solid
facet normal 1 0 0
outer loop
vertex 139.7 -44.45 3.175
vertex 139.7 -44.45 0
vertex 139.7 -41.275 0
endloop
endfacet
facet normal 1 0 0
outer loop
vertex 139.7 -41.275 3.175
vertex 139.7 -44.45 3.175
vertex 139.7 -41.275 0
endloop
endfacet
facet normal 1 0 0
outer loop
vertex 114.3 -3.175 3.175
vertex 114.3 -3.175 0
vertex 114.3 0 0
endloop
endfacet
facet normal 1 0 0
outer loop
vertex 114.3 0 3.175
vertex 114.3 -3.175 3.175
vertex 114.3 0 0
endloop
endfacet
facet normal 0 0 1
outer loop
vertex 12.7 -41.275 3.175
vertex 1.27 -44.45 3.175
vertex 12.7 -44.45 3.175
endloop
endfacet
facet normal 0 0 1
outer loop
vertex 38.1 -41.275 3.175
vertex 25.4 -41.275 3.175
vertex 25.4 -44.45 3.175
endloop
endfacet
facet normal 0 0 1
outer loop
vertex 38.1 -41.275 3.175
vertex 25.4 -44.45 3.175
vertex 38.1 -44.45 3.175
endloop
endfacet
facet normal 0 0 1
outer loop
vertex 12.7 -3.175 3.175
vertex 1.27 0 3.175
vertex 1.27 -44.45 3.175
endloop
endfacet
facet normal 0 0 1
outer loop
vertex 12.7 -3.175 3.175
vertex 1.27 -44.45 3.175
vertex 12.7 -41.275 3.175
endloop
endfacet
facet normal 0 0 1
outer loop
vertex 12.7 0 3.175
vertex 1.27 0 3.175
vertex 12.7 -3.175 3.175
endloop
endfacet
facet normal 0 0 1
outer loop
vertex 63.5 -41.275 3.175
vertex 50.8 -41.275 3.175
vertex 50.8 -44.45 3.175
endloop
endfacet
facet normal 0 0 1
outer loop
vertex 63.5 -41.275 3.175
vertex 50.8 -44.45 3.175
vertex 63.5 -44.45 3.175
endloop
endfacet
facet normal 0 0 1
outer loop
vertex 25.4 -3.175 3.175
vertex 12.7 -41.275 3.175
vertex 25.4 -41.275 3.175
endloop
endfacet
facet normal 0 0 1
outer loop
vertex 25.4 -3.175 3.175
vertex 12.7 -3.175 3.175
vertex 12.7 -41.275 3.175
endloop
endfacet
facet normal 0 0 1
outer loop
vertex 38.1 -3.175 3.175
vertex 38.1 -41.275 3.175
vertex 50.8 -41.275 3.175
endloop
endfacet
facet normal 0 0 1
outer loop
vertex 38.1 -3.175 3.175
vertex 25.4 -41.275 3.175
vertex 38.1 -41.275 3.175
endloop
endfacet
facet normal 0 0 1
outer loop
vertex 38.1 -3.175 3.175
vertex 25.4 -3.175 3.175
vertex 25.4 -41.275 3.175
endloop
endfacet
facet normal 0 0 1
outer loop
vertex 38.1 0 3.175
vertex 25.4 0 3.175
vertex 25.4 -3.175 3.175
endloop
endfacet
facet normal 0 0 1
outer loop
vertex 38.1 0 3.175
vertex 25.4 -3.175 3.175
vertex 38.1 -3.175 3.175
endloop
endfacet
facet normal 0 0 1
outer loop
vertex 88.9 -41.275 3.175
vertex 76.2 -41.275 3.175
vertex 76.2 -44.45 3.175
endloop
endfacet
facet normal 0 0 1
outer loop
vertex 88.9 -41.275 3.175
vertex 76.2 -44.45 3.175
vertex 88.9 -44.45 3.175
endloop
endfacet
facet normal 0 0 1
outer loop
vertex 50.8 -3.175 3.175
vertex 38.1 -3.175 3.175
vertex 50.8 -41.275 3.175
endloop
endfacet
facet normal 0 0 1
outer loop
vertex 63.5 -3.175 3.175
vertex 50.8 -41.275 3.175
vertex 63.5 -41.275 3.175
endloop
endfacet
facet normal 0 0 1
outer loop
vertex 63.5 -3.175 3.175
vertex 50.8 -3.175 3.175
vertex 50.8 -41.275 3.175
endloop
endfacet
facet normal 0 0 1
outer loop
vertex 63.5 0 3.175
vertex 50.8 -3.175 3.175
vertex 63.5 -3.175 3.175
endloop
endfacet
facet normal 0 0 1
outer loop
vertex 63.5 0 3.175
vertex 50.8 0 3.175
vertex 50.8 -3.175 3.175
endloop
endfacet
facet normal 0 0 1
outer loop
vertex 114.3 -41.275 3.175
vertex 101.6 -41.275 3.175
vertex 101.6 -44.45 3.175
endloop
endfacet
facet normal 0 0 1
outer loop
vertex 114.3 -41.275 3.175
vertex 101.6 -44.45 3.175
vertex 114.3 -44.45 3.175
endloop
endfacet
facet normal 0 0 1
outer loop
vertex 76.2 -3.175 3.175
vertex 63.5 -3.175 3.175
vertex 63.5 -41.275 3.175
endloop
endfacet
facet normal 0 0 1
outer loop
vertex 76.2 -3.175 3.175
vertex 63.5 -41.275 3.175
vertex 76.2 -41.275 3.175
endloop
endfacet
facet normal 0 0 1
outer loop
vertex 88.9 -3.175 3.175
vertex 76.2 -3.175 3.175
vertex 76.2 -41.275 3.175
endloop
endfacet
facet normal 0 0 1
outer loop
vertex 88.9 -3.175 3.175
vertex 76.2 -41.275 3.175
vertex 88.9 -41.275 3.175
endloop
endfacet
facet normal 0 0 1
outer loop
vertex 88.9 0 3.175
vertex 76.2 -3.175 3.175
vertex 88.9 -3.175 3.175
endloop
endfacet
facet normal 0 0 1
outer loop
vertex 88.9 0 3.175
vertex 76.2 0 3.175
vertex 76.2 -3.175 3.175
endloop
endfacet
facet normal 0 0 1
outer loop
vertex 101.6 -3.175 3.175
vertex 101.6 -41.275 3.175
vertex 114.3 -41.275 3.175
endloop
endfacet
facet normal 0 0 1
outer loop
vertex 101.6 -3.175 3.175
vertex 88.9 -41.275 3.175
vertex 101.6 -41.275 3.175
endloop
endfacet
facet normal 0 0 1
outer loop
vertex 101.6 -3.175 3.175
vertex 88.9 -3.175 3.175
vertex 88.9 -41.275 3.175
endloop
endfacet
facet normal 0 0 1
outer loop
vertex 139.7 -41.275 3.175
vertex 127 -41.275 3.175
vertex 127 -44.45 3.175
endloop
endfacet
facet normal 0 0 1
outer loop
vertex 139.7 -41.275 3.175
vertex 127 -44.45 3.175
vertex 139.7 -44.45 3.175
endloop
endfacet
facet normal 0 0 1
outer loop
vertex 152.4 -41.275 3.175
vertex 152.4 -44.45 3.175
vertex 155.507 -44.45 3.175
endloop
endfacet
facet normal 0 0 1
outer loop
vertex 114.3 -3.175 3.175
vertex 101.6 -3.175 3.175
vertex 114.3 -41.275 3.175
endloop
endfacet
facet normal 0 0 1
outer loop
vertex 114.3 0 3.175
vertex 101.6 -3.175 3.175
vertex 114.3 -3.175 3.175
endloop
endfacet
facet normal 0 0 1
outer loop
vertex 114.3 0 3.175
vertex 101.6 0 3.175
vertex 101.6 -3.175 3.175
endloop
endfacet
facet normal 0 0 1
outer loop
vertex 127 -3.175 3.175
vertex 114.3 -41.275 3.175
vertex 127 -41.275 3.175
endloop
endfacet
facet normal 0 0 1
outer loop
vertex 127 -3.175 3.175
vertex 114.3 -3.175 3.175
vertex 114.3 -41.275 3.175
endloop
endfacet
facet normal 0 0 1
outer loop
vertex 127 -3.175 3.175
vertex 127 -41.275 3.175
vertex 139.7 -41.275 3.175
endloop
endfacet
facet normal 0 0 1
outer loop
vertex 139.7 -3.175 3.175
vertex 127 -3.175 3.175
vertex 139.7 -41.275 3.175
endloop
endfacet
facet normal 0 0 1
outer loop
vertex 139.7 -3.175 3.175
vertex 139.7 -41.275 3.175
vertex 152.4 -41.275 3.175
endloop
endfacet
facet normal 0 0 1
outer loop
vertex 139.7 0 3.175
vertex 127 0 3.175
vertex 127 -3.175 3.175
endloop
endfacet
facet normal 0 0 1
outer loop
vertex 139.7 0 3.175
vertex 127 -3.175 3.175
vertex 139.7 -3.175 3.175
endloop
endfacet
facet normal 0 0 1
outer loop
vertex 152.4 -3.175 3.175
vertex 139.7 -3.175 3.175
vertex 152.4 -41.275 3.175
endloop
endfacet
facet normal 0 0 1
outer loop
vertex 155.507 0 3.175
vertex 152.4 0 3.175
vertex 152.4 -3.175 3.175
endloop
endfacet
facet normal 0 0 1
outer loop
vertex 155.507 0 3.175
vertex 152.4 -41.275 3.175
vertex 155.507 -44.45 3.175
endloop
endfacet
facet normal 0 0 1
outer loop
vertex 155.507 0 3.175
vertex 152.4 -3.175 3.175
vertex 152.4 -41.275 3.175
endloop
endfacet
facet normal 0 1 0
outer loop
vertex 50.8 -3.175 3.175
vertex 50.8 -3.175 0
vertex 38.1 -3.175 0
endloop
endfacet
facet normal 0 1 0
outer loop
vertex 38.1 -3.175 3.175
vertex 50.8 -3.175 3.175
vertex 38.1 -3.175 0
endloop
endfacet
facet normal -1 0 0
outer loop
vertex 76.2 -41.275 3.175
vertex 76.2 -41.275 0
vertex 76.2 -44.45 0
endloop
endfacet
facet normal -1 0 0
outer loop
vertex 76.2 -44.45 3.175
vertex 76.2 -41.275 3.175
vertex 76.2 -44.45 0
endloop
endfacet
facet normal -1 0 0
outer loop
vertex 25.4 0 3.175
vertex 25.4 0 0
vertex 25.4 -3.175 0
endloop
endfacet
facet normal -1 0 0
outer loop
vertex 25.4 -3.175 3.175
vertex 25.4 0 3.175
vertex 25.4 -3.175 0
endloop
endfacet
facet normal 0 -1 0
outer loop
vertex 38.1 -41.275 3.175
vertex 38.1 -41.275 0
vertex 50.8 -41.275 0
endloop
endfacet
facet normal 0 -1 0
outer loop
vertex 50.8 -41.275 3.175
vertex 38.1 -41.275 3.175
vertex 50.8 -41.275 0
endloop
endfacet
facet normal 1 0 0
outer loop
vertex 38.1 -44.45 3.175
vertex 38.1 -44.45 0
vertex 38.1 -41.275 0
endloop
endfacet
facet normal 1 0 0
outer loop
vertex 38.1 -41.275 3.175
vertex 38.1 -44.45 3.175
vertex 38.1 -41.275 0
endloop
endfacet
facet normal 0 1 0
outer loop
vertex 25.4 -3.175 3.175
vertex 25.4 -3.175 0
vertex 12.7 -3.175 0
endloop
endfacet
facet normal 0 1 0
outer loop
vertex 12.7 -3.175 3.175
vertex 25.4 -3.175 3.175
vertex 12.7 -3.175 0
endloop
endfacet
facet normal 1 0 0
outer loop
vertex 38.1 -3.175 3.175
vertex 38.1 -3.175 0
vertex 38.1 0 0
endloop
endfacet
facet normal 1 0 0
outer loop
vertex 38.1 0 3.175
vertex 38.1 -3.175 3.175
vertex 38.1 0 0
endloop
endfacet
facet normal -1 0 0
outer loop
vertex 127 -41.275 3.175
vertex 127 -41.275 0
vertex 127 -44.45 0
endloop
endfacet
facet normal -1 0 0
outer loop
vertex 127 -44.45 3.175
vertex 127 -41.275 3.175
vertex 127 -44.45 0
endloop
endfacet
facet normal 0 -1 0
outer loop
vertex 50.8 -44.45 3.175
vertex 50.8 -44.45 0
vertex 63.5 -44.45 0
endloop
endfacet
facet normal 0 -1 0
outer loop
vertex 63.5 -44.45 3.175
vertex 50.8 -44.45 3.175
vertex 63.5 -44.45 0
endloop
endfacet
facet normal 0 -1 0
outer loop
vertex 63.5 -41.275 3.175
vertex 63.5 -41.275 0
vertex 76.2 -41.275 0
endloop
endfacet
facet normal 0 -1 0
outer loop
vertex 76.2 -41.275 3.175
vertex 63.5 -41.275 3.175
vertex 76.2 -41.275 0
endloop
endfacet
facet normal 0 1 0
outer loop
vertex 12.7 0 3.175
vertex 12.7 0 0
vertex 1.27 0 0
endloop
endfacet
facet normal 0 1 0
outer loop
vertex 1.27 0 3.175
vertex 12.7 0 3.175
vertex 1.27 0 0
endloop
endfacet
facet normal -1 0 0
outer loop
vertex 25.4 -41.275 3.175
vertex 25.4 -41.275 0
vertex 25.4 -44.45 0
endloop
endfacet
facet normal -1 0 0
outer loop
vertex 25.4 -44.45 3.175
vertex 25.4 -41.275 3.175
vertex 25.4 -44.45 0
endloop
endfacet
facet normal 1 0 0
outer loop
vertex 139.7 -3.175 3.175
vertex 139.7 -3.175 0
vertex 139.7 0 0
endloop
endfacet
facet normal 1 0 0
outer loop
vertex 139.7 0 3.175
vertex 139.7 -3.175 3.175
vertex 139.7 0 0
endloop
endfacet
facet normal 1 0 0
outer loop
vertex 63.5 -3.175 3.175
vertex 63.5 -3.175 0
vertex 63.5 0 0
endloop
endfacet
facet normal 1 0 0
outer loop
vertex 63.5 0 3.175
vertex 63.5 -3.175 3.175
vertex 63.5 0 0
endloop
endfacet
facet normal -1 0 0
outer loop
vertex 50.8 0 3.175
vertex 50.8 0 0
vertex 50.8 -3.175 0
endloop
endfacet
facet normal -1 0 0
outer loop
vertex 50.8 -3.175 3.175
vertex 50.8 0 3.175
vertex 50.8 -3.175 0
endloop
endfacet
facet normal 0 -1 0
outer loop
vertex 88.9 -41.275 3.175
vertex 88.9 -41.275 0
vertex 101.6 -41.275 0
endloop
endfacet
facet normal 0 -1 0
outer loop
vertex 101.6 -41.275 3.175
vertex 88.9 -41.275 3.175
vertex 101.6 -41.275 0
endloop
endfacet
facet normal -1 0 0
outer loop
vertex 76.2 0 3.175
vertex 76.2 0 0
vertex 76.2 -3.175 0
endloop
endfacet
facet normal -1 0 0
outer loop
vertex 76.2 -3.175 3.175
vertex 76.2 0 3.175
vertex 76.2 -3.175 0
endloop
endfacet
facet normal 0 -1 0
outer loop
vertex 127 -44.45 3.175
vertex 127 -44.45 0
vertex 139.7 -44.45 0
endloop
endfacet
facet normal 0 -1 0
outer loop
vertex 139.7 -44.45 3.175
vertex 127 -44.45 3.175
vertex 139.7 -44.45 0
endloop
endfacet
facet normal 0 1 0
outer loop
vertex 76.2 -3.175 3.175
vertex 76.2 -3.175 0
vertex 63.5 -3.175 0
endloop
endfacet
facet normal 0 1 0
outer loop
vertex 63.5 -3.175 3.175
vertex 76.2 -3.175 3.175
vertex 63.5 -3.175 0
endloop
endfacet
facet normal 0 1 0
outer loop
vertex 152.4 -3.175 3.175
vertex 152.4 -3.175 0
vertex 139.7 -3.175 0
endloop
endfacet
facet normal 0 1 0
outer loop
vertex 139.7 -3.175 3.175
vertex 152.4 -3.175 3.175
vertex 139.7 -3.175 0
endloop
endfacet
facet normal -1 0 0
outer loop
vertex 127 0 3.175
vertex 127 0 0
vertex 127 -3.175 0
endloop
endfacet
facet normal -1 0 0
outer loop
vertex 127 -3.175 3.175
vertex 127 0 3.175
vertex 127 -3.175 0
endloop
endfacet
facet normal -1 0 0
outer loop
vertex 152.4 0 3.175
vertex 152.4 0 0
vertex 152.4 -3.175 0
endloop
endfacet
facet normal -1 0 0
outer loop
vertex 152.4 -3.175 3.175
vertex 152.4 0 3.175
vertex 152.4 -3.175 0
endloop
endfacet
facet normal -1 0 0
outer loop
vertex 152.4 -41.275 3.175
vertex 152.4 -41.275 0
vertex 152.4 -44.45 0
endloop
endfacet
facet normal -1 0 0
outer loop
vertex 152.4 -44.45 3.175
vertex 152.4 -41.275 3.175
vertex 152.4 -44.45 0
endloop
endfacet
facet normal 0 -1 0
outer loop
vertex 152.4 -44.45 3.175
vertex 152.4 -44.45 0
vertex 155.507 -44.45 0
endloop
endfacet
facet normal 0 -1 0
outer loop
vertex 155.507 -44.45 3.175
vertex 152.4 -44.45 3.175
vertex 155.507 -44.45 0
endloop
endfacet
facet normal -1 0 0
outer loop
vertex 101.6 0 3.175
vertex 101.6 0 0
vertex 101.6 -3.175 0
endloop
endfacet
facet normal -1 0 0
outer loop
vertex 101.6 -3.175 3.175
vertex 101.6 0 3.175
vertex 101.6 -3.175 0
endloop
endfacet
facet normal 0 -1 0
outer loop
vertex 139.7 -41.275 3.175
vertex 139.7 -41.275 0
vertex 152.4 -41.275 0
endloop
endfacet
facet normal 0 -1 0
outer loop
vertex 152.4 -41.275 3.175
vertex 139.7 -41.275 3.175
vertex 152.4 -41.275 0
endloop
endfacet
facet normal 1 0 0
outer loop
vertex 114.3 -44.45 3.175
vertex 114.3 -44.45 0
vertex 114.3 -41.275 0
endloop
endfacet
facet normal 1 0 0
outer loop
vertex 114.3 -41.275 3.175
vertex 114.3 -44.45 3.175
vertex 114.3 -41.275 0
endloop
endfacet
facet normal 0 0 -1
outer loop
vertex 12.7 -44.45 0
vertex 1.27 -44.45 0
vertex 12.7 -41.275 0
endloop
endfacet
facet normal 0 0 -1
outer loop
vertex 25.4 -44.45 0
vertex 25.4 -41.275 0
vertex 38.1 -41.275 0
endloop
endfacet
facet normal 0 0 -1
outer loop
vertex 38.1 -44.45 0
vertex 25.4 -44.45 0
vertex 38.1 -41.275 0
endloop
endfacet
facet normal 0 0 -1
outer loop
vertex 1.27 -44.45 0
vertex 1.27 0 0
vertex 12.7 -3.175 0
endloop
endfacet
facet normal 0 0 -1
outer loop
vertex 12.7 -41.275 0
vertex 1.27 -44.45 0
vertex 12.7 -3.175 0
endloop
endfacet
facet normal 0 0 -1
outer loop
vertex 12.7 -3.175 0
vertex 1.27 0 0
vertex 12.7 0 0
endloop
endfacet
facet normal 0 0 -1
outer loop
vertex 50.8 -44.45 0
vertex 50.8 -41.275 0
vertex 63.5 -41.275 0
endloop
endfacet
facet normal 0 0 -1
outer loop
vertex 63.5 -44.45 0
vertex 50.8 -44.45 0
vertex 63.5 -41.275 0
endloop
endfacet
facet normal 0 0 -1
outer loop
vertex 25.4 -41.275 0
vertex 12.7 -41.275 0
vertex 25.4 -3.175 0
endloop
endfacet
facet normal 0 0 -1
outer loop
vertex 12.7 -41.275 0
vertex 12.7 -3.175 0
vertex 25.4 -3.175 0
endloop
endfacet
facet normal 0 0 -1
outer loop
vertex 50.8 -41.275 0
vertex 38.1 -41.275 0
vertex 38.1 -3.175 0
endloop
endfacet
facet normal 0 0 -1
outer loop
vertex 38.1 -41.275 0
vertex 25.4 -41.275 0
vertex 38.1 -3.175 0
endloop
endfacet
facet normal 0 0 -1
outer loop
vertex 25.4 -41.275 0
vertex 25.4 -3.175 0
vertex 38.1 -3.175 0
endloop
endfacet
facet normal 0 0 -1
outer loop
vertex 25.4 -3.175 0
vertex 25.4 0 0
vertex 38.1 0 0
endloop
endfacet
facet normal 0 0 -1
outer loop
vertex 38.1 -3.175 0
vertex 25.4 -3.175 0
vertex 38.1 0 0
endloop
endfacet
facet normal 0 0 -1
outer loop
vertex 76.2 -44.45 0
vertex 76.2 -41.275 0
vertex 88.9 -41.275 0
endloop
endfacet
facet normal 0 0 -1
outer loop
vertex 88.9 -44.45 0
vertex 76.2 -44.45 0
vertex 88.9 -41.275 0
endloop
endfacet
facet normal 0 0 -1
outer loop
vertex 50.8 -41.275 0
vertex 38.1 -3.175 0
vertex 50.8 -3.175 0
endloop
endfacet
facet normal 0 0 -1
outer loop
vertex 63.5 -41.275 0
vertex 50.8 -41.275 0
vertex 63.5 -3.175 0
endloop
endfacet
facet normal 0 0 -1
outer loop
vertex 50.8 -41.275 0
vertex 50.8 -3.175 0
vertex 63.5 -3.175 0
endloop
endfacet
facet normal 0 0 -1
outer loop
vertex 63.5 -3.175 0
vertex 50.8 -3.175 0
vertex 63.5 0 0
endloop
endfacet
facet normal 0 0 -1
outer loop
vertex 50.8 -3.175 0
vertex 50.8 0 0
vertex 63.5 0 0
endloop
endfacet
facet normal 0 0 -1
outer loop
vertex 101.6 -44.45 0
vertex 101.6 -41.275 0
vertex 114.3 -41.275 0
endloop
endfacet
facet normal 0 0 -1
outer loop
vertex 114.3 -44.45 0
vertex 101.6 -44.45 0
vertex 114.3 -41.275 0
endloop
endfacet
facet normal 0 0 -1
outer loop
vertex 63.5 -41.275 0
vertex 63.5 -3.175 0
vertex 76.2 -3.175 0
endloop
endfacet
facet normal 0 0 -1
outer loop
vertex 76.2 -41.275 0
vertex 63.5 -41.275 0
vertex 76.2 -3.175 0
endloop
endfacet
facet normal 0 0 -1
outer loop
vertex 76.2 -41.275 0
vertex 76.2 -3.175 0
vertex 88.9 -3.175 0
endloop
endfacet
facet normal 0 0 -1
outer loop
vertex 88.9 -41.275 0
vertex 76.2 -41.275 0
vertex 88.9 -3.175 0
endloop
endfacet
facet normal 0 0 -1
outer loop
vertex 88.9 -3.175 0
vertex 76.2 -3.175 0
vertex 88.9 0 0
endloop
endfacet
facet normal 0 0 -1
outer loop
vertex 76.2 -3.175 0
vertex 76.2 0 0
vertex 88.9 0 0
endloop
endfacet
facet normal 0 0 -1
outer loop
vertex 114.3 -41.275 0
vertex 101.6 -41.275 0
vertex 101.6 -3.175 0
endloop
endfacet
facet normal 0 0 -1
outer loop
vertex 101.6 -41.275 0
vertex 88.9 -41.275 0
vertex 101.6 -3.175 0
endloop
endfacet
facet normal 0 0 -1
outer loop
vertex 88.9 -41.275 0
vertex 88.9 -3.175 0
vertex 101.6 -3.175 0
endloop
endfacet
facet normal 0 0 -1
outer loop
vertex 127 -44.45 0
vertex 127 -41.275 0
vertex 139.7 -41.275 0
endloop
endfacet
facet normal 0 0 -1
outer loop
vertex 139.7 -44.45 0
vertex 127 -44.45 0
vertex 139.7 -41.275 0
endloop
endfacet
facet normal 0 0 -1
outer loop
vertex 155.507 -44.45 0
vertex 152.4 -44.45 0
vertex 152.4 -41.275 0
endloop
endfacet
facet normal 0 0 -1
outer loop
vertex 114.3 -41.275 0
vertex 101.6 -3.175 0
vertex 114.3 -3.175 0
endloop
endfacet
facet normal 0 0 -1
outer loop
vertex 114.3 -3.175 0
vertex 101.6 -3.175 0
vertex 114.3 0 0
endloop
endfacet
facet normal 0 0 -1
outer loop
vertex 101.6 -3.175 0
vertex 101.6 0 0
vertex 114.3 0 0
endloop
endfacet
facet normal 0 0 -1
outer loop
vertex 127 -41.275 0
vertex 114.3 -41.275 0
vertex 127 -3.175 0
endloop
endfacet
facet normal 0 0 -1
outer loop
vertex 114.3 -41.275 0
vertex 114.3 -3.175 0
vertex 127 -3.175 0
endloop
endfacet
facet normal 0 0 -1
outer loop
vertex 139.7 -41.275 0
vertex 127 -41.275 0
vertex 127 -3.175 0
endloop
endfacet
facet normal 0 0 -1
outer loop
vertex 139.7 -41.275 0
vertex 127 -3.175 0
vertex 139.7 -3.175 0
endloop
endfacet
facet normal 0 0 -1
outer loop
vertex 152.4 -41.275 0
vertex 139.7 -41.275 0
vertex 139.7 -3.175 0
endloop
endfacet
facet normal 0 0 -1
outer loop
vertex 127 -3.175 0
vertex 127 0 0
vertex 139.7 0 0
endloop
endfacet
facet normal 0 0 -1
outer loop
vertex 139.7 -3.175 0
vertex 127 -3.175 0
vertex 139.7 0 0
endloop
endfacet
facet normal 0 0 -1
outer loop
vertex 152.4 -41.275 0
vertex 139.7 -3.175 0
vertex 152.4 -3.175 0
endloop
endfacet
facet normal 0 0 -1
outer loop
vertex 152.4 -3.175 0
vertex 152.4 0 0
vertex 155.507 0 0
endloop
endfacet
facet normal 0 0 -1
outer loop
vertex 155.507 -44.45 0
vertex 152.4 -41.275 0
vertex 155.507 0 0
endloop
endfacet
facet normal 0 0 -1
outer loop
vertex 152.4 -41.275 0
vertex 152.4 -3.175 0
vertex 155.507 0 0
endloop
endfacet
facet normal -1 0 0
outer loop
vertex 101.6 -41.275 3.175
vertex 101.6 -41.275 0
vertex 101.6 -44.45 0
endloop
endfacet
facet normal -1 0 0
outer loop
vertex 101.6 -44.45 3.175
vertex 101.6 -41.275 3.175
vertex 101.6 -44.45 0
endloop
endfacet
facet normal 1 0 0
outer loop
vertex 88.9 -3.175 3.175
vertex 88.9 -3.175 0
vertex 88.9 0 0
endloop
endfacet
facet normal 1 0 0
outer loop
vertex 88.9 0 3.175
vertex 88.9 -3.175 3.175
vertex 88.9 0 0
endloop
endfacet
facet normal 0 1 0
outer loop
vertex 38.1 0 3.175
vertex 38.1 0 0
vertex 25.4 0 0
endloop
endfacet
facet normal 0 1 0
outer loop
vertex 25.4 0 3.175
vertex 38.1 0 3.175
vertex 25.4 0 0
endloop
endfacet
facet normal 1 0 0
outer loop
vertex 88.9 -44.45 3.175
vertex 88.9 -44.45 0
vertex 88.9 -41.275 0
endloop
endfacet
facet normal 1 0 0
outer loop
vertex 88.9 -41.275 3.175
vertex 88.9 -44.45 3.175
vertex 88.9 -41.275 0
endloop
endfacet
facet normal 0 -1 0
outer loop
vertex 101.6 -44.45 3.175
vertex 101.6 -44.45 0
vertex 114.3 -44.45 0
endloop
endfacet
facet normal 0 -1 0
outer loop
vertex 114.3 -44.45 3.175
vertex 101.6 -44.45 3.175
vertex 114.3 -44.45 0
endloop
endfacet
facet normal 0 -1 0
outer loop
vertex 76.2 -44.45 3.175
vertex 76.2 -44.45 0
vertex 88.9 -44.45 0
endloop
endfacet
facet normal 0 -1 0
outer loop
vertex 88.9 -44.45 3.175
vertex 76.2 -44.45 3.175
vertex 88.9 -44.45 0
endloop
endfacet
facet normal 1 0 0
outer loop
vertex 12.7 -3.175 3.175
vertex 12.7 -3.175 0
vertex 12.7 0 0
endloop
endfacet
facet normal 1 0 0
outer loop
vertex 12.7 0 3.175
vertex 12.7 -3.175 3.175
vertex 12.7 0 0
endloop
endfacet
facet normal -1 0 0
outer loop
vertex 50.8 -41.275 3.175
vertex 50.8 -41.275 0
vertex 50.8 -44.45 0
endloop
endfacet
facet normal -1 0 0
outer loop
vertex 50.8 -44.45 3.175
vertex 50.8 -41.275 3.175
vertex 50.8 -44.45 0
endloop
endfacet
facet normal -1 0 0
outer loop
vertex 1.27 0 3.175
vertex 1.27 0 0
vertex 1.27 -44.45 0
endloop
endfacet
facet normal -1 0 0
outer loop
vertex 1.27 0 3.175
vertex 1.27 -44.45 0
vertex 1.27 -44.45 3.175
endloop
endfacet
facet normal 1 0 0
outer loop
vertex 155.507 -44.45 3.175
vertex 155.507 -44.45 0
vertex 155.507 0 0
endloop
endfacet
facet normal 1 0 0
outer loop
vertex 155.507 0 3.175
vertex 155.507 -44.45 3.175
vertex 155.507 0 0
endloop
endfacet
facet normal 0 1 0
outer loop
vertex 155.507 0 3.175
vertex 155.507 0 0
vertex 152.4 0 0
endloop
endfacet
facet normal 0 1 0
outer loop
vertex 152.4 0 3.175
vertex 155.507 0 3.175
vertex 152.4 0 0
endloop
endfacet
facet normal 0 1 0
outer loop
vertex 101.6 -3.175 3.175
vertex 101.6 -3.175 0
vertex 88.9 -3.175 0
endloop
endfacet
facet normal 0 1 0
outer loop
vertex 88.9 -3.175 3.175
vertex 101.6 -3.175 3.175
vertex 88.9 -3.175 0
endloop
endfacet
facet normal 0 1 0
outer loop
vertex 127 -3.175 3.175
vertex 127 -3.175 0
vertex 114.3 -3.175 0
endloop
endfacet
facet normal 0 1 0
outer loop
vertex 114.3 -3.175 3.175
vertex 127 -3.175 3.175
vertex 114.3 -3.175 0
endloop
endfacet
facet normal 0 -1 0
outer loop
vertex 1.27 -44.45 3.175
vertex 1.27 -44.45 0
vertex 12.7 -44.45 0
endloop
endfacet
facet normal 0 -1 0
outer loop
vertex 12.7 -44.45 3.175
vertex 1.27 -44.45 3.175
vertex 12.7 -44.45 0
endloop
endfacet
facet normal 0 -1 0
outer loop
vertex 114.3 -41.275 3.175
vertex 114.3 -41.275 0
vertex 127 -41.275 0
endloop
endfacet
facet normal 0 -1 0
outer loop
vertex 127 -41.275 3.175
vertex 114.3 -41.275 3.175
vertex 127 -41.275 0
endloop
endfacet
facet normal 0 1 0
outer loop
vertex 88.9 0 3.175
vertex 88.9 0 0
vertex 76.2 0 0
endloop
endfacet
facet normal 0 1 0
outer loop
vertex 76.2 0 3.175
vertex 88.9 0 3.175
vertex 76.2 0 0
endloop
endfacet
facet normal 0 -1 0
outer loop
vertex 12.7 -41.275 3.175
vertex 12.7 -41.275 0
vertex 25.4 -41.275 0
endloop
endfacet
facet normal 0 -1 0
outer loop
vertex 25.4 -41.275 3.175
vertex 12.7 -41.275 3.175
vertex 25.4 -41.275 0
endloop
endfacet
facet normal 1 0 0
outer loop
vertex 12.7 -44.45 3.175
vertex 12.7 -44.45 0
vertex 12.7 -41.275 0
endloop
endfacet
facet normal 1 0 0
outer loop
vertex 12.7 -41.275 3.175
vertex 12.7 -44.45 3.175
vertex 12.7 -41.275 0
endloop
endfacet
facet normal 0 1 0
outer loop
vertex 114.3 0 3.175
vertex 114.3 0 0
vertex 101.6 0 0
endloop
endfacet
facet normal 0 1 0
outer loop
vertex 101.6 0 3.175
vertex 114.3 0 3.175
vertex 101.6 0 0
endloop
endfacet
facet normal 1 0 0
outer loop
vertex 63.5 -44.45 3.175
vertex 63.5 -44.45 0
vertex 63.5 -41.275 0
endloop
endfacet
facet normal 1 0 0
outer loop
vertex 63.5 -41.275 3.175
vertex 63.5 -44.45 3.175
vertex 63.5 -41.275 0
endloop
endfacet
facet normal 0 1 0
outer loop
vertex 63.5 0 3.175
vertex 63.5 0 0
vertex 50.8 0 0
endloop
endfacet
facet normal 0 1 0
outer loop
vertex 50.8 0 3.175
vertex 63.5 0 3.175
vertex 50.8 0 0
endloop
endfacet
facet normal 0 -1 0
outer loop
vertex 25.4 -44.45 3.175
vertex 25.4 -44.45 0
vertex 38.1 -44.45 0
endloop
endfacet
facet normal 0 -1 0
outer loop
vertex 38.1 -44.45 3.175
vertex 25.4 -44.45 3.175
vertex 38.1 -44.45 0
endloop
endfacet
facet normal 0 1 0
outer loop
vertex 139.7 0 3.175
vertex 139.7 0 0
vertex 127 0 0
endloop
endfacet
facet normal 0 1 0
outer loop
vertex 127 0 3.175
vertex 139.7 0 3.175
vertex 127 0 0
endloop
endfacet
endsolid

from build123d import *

# Parameters (mm, degrees)
BOSS_EXTRUDE1_DEPTH = 3.175
SKETCH2_W           = 3.175
SKETCH2_H           = 44.45
CUT_EXTRUDE1_DEPTH  = 1.27


with BuildPart() as part:
    # Sketch1 → Boss-Extrude1 (new body)
    with BuildSketch(Plane.XY):
        Polygon((0, 0), (0, -44.45), (12.7, -44.45), (12.7, -41.275), (25.4, -41.275), (25.4, -44.45), (38.1, -44.45), (38.1, -41.275), (50.8, -41.275), (50.8, -44.45), (63.5, -44.45), (63.5, -41.275), (76.2, -41.275), (76.2, -44.45), (88.9, -44.45), (88.9, -41.275), (101.6, -41.275), (101.6, -44.45), (114.3, -44.45), (114.3, -41.275), (127, -41.275), (127, -44.45), (139.7, -44.45), (139.7, -41.275), (152.4, -41.275), (152.4, -44.45), (155.507436, -44.45), (155.507436, 0), (152.4, 0), (152.4, -3.175), (139.7, -3.175), (139.7, 0), (127, 0), (127, -3.175), (114.3, -3.175), (114.3, 0), (101.6, 0), (101.6, -3.175), (88.9, -3.175), (88.9, 0), (76.2, 0), (76.2, -3.175), (63.5, -3.175), (63.5, 0), (50.8, 0), (50.8, -3.175), (38.1, -3.175), (38.1, 0), (25.4, 0), (25.4, -3.175), (12.7, -3.175), (12.7, 0), align=None)
    extrude(amount=BOSS_EXTRUDE1_DEPTH)

    # Sketch2 → Cut-Extrude1 (cut)
    with BuildSketch(Plane.ZY):
        with Locations((1.5875, -22.225)):
            Rectangle(SKETCH2_W, SKETCH2_H)
    extrude(amount=-CUT_EXTRUDE1_DEPTH, mode=Mode.SUBTRACT)


solid = part.part
